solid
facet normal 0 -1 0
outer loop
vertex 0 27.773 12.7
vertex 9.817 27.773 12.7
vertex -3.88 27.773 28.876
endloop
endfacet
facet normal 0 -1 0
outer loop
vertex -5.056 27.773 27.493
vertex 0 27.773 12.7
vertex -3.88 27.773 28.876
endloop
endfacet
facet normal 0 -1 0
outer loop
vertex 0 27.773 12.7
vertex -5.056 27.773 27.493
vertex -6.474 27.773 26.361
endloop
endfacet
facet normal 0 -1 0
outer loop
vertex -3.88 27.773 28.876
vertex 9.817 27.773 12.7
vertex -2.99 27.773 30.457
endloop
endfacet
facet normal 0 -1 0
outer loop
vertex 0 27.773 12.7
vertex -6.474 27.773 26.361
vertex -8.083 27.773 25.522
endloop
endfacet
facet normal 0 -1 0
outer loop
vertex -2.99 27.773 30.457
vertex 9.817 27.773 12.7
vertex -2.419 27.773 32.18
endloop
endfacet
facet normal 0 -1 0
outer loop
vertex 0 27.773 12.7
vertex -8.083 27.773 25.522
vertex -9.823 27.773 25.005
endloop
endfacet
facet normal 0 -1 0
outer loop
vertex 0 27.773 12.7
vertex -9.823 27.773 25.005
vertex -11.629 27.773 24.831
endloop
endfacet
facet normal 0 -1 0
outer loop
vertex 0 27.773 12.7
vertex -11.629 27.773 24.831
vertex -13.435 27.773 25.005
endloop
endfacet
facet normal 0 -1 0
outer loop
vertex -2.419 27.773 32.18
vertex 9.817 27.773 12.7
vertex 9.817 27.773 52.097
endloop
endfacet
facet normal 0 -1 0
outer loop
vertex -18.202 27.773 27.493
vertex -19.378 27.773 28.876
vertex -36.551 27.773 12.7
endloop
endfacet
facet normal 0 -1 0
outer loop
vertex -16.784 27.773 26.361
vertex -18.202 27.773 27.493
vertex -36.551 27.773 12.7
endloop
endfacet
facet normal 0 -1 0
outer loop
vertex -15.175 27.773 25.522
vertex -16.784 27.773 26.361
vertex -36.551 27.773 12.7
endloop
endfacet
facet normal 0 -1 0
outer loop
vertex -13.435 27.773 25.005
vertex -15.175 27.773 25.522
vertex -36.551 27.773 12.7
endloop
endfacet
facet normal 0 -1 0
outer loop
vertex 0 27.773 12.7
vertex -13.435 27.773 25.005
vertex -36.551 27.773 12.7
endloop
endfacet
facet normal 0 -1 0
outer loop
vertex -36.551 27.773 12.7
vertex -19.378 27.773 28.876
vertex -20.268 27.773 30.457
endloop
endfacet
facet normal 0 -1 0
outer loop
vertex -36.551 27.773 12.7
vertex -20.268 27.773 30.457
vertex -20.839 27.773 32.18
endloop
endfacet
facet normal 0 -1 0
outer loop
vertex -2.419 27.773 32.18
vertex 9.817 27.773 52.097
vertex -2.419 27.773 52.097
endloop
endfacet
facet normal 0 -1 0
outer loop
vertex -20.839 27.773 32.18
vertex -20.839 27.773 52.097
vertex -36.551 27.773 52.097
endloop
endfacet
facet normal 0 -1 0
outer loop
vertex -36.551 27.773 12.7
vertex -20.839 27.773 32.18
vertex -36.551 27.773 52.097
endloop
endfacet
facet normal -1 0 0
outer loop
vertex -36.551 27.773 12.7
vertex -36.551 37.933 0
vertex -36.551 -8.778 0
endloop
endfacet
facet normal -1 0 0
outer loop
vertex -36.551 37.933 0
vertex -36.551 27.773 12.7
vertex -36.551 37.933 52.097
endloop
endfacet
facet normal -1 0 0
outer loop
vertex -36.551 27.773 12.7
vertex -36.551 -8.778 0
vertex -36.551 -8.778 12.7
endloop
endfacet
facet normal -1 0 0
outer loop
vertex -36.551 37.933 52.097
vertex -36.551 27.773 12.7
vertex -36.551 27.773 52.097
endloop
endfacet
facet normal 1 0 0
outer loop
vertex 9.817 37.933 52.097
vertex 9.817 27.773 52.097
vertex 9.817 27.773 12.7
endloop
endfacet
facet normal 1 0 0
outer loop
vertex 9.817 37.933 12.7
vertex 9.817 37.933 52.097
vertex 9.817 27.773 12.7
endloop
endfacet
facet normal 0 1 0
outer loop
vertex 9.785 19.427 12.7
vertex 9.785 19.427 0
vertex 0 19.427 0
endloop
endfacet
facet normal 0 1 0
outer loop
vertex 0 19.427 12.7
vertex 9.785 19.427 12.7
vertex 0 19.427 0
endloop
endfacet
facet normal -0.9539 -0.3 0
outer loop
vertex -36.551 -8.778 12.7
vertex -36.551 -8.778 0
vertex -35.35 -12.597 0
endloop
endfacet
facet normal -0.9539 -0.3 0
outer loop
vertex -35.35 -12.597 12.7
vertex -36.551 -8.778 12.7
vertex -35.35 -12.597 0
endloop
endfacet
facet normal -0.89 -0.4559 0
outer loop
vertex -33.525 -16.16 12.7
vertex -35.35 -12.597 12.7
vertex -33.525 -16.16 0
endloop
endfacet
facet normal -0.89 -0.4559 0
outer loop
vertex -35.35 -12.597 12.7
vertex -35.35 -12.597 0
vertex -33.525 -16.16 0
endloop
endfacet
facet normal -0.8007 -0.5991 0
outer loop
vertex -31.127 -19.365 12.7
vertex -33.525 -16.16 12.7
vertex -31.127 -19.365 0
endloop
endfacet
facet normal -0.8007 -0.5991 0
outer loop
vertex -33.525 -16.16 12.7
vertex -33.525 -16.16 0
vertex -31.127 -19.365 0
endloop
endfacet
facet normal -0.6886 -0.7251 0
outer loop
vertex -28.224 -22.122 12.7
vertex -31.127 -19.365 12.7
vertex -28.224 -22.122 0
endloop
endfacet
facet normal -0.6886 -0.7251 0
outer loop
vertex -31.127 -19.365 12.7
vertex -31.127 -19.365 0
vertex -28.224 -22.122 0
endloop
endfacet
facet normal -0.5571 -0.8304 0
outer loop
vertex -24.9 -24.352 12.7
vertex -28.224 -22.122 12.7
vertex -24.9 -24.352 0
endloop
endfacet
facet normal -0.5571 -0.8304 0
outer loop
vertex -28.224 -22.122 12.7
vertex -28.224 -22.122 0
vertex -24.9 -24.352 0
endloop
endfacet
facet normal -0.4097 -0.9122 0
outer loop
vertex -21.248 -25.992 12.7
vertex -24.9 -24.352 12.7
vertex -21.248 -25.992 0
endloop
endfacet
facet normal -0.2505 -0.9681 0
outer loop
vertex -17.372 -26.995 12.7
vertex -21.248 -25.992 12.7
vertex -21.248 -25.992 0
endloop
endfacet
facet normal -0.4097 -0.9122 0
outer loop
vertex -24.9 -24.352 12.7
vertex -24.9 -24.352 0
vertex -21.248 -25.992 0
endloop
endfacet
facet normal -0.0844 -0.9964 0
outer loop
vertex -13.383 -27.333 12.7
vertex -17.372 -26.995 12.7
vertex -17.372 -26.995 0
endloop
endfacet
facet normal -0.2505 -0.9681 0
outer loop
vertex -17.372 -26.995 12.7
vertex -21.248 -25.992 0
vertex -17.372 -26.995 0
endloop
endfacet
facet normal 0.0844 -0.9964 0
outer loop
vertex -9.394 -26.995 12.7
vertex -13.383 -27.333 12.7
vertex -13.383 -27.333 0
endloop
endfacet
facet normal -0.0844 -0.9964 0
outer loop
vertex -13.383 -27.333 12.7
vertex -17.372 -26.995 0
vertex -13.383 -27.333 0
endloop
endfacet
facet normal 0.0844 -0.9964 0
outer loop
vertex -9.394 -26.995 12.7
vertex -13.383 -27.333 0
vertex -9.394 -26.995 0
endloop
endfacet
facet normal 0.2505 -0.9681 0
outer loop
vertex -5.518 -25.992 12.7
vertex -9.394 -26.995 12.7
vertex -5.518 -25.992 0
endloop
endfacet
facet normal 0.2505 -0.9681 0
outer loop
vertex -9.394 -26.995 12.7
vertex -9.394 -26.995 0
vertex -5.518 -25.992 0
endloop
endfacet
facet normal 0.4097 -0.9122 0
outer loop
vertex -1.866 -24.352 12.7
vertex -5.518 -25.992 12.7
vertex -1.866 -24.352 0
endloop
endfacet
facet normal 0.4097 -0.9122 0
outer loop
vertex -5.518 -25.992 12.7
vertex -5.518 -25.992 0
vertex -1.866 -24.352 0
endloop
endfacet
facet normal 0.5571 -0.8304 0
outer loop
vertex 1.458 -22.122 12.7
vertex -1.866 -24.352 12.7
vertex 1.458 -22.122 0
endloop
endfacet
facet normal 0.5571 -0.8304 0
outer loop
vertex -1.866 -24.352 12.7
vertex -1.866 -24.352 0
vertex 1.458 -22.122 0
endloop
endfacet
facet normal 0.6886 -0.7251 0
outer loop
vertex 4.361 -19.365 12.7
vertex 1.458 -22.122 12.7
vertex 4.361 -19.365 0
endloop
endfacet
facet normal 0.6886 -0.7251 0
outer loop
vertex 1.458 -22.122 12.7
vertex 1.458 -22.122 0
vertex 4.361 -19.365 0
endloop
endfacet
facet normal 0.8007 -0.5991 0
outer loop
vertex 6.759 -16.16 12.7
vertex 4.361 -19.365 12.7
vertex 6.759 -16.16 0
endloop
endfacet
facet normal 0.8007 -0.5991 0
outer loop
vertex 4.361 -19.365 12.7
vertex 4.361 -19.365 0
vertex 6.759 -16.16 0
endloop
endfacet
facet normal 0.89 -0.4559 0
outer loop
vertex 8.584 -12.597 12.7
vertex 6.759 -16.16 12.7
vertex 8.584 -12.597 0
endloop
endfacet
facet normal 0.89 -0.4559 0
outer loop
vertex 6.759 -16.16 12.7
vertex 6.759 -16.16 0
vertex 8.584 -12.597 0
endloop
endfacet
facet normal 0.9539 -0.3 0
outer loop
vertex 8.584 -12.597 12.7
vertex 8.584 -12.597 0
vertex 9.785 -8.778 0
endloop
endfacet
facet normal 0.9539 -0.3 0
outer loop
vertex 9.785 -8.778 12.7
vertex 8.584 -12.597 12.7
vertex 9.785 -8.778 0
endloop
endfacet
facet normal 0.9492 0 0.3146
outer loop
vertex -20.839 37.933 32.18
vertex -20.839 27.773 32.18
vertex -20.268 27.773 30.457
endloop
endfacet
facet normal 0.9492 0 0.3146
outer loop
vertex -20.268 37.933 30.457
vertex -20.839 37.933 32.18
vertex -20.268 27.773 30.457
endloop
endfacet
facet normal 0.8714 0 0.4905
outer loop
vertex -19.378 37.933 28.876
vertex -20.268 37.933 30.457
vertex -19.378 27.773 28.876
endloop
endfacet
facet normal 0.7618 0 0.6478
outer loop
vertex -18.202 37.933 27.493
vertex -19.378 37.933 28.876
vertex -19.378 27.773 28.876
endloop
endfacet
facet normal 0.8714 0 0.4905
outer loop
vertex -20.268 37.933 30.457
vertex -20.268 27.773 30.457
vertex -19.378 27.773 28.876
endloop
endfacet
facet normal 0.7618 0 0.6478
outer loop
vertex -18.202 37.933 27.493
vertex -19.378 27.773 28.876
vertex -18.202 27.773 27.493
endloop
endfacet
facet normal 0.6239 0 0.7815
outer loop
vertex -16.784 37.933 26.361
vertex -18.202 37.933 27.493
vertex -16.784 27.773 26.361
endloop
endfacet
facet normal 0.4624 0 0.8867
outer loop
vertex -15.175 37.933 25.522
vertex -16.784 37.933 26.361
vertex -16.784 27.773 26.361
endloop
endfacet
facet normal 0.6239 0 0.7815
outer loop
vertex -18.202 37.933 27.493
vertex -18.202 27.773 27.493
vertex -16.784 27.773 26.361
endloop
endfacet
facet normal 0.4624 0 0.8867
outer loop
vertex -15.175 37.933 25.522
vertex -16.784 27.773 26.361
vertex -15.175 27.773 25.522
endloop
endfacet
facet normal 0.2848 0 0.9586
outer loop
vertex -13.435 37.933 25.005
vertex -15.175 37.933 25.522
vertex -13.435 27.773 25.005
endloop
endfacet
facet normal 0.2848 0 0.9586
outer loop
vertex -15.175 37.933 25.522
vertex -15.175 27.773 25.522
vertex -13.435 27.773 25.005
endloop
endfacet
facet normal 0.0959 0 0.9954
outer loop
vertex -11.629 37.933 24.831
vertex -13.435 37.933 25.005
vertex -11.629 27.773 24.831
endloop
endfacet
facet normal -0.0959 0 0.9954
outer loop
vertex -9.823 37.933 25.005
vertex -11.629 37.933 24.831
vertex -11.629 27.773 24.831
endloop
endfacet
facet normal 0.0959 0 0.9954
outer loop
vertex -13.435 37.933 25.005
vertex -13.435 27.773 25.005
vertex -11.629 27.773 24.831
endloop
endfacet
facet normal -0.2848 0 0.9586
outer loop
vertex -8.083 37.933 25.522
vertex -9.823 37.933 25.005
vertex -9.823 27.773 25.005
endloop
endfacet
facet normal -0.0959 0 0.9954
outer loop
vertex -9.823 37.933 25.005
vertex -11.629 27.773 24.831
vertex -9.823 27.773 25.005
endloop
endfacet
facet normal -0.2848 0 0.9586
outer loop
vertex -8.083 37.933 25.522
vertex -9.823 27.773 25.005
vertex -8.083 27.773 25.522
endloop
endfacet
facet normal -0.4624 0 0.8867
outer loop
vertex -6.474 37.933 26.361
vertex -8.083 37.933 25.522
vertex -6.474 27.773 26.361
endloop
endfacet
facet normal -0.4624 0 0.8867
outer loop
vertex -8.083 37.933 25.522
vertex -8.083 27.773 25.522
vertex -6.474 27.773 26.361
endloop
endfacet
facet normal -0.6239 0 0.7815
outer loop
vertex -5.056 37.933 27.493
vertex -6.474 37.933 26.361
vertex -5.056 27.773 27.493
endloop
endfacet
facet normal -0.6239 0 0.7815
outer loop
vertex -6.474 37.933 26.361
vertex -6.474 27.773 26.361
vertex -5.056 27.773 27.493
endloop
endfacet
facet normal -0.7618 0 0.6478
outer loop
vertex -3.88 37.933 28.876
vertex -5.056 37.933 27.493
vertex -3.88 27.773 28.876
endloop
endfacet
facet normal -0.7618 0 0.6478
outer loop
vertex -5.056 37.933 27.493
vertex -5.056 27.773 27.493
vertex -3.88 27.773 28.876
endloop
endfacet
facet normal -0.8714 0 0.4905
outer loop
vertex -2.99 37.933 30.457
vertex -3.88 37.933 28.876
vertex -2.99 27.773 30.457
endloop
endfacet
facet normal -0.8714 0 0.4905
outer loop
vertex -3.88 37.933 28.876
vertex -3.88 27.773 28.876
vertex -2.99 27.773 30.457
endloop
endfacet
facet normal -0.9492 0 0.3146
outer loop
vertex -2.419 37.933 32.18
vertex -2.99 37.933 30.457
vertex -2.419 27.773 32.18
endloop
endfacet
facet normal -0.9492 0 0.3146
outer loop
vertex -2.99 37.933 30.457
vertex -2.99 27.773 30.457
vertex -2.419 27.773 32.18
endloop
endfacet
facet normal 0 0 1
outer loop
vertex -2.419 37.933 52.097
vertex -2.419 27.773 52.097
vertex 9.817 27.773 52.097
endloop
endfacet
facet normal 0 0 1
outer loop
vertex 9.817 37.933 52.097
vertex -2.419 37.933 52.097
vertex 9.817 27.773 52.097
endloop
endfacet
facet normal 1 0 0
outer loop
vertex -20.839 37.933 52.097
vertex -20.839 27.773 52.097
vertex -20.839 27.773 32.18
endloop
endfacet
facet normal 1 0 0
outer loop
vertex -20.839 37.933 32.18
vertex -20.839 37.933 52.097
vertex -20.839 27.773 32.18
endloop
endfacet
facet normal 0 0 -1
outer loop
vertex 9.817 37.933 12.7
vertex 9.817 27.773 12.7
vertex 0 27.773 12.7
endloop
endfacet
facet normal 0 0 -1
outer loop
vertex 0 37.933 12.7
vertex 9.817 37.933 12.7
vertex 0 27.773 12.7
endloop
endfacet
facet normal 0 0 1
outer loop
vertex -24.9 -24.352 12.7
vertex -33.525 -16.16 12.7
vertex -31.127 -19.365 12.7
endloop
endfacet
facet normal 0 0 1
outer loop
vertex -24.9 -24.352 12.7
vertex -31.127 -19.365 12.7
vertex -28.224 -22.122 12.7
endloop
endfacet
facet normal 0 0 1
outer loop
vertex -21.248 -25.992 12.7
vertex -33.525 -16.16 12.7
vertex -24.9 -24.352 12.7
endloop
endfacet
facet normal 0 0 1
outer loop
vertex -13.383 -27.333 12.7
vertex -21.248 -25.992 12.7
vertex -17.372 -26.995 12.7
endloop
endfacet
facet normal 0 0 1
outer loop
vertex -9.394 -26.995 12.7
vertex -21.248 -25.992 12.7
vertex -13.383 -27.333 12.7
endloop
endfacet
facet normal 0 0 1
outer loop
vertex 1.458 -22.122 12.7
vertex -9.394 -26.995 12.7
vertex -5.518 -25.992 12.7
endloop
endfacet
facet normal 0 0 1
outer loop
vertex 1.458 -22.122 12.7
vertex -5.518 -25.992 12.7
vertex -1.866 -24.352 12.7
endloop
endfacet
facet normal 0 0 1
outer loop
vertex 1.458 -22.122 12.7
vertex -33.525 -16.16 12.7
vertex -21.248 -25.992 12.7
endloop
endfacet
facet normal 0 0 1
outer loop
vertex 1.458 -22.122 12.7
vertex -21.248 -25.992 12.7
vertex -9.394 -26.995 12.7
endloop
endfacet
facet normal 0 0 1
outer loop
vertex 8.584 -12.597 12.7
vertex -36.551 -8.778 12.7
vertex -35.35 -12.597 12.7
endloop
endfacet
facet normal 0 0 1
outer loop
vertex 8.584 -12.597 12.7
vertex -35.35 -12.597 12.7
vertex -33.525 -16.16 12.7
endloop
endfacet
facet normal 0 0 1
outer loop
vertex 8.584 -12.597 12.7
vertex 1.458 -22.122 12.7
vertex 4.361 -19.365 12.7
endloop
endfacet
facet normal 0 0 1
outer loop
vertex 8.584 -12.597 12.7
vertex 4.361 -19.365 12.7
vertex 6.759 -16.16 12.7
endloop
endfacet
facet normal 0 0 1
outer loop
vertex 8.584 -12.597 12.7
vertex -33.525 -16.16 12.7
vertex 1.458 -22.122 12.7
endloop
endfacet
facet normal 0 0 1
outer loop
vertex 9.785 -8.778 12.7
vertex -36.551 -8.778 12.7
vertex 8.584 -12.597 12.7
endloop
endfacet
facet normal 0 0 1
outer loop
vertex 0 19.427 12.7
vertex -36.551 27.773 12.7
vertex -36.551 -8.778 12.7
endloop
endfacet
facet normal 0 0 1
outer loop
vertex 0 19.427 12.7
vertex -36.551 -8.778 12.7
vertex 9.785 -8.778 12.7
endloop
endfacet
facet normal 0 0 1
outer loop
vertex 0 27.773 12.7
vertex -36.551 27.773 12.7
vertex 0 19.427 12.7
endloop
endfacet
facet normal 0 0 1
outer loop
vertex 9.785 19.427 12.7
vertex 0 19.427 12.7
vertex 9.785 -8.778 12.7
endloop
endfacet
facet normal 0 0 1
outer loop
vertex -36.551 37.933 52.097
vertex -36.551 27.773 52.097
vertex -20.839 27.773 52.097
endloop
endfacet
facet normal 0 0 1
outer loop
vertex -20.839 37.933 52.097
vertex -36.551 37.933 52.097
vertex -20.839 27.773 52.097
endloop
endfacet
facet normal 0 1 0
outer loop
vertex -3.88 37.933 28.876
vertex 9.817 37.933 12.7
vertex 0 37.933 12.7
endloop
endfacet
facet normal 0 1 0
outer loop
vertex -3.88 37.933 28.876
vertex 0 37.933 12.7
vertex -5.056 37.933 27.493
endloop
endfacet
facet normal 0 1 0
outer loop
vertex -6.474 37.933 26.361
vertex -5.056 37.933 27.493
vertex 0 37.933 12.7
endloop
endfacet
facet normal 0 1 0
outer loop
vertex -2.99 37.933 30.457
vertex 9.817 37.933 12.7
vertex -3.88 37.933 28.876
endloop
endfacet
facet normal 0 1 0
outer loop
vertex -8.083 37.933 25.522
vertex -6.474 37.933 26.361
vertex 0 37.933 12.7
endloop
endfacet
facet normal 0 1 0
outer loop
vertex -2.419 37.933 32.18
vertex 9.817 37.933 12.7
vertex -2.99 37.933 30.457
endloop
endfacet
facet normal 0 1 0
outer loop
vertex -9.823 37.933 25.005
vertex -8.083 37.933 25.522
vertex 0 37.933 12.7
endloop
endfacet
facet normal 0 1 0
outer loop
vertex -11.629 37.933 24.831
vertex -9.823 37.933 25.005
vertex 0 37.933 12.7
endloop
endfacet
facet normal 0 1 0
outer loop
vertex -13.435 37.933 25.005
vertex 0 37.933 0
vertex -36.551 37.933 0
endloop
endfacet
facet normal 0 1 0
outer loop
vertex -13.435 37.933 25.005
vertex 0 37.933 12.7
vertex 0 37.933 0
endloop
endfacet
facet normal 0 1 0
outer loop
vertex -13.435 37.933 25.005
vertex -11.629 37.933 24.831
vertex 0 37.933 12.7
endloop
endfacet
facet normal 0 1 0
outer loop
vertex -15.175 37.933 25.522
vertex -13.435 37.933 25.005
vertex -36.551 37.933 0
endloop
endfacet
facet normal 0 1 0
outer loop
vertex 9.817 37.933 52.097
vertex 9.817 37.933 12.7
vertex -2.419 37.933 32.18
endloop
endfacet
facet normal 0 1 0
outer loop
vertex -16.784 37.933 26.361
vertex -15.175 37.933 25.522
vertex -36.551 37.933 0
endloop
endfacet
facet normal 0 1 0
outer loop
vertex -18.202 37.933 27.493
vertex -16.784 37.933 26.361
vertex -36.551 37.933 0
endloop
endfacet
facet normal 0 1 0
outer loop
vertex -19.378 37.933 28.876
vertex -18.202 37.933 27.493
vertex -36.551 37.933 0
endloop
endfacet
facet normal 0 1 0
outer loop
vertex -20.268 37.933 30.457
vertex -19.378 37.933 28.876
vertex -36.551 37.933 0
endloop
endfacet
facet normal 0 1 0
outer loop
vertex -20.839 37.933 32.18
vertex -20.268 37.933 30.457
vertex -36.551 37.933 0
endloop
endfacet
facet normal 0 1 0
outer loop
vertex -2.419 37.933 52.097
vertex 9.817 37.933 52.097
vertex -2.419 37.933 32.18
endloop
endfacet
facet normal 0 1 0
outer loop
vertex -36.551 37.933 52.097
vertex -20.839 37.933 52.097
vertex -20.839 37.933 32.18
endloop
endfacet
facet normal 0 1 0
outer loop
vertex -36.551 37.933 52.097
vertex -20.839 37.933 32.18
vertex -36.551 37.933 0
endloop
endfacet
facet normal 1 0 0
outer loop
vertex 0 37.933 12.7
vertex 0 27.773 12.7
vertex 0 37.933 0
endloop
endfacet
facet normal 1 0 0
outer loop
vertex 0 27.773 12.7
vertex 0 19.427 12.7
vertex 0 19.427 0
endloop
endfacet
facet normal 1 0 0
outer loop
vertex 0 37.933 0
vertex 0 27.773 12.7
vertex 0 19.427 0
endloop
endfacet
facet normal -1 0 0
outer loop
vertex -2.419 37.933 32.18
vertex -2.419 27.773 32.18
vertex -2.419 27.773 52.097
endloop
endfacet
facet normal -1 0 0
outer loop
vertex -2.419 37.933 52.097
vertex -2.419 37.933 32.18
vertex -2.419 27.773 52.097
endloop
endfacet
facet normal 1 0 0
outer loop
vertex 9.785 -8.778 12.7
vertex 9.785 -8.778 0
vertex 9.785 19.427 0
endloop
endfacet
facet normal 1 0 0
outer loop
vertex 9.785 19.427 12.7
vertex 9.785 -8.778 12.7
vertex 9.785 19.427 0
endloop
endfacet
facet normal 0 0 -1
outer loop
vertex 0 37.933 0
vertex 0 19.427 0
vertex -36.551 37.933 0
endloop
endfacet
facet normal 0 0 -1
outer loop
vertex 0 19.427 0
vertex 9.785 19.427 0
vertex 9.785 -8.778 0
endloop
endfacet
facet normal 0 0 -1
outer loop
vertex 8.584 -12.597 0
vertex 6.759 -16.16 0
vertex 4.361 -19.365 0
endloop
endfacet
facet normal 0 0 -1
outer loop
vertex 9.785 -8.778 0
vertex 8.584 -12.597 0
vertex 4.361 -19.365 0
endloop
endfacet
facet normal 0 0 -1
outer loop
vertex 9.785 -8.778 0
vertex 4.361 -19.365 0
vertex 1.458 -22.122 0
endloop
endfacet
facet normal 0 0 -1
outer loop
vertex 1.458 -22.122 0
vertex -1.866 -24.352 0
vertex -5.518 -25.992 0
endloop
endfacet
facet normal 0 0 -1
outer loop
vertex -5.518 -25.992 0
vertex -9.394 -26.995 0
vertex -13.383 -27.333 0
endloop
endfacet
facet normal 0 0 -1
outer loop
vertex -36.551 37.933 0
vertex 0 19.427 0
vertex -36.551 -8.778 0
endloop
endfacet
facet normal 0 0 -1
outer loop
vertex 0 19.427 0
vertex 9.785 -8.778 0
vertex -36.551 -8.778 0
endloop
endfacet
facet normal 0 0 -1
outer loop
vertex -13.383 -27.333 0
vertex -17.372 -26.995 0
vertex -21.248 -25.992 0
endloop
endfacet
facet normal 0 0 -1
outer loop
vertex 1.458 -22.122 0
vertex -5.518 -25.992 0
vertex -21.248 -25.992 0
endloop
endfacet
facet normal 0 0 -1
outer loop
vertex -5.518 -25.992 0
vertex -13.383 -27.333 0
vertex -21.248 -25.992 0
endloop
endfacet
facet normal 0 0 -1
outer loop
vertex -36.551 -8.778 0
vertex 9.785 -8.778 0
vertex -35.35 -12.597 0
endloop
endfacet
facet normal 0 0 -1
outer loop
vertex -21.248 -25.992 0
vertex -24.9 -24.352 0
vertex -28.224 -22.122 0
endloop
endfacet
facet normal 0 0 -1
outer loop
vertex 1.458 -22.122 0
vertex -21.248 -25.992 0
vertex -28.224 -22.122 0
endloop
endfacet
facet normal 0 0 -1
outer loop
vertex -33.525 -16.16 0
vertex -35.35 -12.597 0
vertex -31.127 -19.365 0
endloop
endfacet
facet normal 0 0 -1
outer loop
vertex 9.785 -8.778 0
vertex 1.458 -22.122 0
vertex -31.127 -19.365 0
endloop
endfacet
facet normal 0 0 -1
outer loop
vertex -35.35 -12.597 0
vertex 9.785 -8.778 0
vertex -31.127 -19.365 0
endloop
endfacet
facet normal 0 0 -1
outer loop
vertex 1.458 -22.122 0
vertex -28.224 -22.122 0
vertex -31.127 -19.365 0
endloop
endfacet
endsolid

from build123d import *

# Parameters (mm, degrees)
F1_DEPTH = 12.7
F3_DEPTH = 10.16


with BuildPart() as f1:
    # F0 (on Top) → F1 (new body)
    with BuildSketch(Plane.XY):
        with BuildLine():
            Line((0, 27.773257), (-36.551334, 27.773257))
            Line((-36.551334, 27.773257), (-36.551334, -8.778076))
            ThreePointArc((-36.551334, -8.778076), (-13.38297, -27.332701), (9.785393, -8.778076))
            Line((9.785393, -8.778076), (9.785393, 19.426888))
            Line((9.785393, 19.426888), (0, 19.426888))
            Line((0, 19.426888), (0, 27.773257))
        make_face()
    extrude(amount=F1_DEPTH)

    # F2 (on face) → F3 (join)
    with BuildSketch(Plane(origin=(0, 27.773257, 0), x_dir=(-1, 0, 0), z_dir=(0, 1, 0))):
        with BuildLine():
            Line((0, 0), (36.551334, 0))
            Line((36.551334, 0), (36.551334, 52.096579))
            Line((36.551334, 52.096579), (20.838689, 52.096579))
            Line((20.838689, 52.096579), (20.838689, 32.179791))
            ThreePointArc((20.838689, 32.179791), (11.628905, 24.830871), (2.419121, 32.179791))
            Line((2.419121, 32.179791), (2.419121, 52.096579))
            Line((2.419121, 52.096579), (-9.817014, 52.096579))
            Line((-9.817014, 52.096579), (-9.817014, 12.7))
            Line((-9.817014, 12.7), (0, 12.7))
            Line((0, 12.7), (0, 0))
        make_face()
    extrude(amount=F3_DEPTH)


solid = f1.part
